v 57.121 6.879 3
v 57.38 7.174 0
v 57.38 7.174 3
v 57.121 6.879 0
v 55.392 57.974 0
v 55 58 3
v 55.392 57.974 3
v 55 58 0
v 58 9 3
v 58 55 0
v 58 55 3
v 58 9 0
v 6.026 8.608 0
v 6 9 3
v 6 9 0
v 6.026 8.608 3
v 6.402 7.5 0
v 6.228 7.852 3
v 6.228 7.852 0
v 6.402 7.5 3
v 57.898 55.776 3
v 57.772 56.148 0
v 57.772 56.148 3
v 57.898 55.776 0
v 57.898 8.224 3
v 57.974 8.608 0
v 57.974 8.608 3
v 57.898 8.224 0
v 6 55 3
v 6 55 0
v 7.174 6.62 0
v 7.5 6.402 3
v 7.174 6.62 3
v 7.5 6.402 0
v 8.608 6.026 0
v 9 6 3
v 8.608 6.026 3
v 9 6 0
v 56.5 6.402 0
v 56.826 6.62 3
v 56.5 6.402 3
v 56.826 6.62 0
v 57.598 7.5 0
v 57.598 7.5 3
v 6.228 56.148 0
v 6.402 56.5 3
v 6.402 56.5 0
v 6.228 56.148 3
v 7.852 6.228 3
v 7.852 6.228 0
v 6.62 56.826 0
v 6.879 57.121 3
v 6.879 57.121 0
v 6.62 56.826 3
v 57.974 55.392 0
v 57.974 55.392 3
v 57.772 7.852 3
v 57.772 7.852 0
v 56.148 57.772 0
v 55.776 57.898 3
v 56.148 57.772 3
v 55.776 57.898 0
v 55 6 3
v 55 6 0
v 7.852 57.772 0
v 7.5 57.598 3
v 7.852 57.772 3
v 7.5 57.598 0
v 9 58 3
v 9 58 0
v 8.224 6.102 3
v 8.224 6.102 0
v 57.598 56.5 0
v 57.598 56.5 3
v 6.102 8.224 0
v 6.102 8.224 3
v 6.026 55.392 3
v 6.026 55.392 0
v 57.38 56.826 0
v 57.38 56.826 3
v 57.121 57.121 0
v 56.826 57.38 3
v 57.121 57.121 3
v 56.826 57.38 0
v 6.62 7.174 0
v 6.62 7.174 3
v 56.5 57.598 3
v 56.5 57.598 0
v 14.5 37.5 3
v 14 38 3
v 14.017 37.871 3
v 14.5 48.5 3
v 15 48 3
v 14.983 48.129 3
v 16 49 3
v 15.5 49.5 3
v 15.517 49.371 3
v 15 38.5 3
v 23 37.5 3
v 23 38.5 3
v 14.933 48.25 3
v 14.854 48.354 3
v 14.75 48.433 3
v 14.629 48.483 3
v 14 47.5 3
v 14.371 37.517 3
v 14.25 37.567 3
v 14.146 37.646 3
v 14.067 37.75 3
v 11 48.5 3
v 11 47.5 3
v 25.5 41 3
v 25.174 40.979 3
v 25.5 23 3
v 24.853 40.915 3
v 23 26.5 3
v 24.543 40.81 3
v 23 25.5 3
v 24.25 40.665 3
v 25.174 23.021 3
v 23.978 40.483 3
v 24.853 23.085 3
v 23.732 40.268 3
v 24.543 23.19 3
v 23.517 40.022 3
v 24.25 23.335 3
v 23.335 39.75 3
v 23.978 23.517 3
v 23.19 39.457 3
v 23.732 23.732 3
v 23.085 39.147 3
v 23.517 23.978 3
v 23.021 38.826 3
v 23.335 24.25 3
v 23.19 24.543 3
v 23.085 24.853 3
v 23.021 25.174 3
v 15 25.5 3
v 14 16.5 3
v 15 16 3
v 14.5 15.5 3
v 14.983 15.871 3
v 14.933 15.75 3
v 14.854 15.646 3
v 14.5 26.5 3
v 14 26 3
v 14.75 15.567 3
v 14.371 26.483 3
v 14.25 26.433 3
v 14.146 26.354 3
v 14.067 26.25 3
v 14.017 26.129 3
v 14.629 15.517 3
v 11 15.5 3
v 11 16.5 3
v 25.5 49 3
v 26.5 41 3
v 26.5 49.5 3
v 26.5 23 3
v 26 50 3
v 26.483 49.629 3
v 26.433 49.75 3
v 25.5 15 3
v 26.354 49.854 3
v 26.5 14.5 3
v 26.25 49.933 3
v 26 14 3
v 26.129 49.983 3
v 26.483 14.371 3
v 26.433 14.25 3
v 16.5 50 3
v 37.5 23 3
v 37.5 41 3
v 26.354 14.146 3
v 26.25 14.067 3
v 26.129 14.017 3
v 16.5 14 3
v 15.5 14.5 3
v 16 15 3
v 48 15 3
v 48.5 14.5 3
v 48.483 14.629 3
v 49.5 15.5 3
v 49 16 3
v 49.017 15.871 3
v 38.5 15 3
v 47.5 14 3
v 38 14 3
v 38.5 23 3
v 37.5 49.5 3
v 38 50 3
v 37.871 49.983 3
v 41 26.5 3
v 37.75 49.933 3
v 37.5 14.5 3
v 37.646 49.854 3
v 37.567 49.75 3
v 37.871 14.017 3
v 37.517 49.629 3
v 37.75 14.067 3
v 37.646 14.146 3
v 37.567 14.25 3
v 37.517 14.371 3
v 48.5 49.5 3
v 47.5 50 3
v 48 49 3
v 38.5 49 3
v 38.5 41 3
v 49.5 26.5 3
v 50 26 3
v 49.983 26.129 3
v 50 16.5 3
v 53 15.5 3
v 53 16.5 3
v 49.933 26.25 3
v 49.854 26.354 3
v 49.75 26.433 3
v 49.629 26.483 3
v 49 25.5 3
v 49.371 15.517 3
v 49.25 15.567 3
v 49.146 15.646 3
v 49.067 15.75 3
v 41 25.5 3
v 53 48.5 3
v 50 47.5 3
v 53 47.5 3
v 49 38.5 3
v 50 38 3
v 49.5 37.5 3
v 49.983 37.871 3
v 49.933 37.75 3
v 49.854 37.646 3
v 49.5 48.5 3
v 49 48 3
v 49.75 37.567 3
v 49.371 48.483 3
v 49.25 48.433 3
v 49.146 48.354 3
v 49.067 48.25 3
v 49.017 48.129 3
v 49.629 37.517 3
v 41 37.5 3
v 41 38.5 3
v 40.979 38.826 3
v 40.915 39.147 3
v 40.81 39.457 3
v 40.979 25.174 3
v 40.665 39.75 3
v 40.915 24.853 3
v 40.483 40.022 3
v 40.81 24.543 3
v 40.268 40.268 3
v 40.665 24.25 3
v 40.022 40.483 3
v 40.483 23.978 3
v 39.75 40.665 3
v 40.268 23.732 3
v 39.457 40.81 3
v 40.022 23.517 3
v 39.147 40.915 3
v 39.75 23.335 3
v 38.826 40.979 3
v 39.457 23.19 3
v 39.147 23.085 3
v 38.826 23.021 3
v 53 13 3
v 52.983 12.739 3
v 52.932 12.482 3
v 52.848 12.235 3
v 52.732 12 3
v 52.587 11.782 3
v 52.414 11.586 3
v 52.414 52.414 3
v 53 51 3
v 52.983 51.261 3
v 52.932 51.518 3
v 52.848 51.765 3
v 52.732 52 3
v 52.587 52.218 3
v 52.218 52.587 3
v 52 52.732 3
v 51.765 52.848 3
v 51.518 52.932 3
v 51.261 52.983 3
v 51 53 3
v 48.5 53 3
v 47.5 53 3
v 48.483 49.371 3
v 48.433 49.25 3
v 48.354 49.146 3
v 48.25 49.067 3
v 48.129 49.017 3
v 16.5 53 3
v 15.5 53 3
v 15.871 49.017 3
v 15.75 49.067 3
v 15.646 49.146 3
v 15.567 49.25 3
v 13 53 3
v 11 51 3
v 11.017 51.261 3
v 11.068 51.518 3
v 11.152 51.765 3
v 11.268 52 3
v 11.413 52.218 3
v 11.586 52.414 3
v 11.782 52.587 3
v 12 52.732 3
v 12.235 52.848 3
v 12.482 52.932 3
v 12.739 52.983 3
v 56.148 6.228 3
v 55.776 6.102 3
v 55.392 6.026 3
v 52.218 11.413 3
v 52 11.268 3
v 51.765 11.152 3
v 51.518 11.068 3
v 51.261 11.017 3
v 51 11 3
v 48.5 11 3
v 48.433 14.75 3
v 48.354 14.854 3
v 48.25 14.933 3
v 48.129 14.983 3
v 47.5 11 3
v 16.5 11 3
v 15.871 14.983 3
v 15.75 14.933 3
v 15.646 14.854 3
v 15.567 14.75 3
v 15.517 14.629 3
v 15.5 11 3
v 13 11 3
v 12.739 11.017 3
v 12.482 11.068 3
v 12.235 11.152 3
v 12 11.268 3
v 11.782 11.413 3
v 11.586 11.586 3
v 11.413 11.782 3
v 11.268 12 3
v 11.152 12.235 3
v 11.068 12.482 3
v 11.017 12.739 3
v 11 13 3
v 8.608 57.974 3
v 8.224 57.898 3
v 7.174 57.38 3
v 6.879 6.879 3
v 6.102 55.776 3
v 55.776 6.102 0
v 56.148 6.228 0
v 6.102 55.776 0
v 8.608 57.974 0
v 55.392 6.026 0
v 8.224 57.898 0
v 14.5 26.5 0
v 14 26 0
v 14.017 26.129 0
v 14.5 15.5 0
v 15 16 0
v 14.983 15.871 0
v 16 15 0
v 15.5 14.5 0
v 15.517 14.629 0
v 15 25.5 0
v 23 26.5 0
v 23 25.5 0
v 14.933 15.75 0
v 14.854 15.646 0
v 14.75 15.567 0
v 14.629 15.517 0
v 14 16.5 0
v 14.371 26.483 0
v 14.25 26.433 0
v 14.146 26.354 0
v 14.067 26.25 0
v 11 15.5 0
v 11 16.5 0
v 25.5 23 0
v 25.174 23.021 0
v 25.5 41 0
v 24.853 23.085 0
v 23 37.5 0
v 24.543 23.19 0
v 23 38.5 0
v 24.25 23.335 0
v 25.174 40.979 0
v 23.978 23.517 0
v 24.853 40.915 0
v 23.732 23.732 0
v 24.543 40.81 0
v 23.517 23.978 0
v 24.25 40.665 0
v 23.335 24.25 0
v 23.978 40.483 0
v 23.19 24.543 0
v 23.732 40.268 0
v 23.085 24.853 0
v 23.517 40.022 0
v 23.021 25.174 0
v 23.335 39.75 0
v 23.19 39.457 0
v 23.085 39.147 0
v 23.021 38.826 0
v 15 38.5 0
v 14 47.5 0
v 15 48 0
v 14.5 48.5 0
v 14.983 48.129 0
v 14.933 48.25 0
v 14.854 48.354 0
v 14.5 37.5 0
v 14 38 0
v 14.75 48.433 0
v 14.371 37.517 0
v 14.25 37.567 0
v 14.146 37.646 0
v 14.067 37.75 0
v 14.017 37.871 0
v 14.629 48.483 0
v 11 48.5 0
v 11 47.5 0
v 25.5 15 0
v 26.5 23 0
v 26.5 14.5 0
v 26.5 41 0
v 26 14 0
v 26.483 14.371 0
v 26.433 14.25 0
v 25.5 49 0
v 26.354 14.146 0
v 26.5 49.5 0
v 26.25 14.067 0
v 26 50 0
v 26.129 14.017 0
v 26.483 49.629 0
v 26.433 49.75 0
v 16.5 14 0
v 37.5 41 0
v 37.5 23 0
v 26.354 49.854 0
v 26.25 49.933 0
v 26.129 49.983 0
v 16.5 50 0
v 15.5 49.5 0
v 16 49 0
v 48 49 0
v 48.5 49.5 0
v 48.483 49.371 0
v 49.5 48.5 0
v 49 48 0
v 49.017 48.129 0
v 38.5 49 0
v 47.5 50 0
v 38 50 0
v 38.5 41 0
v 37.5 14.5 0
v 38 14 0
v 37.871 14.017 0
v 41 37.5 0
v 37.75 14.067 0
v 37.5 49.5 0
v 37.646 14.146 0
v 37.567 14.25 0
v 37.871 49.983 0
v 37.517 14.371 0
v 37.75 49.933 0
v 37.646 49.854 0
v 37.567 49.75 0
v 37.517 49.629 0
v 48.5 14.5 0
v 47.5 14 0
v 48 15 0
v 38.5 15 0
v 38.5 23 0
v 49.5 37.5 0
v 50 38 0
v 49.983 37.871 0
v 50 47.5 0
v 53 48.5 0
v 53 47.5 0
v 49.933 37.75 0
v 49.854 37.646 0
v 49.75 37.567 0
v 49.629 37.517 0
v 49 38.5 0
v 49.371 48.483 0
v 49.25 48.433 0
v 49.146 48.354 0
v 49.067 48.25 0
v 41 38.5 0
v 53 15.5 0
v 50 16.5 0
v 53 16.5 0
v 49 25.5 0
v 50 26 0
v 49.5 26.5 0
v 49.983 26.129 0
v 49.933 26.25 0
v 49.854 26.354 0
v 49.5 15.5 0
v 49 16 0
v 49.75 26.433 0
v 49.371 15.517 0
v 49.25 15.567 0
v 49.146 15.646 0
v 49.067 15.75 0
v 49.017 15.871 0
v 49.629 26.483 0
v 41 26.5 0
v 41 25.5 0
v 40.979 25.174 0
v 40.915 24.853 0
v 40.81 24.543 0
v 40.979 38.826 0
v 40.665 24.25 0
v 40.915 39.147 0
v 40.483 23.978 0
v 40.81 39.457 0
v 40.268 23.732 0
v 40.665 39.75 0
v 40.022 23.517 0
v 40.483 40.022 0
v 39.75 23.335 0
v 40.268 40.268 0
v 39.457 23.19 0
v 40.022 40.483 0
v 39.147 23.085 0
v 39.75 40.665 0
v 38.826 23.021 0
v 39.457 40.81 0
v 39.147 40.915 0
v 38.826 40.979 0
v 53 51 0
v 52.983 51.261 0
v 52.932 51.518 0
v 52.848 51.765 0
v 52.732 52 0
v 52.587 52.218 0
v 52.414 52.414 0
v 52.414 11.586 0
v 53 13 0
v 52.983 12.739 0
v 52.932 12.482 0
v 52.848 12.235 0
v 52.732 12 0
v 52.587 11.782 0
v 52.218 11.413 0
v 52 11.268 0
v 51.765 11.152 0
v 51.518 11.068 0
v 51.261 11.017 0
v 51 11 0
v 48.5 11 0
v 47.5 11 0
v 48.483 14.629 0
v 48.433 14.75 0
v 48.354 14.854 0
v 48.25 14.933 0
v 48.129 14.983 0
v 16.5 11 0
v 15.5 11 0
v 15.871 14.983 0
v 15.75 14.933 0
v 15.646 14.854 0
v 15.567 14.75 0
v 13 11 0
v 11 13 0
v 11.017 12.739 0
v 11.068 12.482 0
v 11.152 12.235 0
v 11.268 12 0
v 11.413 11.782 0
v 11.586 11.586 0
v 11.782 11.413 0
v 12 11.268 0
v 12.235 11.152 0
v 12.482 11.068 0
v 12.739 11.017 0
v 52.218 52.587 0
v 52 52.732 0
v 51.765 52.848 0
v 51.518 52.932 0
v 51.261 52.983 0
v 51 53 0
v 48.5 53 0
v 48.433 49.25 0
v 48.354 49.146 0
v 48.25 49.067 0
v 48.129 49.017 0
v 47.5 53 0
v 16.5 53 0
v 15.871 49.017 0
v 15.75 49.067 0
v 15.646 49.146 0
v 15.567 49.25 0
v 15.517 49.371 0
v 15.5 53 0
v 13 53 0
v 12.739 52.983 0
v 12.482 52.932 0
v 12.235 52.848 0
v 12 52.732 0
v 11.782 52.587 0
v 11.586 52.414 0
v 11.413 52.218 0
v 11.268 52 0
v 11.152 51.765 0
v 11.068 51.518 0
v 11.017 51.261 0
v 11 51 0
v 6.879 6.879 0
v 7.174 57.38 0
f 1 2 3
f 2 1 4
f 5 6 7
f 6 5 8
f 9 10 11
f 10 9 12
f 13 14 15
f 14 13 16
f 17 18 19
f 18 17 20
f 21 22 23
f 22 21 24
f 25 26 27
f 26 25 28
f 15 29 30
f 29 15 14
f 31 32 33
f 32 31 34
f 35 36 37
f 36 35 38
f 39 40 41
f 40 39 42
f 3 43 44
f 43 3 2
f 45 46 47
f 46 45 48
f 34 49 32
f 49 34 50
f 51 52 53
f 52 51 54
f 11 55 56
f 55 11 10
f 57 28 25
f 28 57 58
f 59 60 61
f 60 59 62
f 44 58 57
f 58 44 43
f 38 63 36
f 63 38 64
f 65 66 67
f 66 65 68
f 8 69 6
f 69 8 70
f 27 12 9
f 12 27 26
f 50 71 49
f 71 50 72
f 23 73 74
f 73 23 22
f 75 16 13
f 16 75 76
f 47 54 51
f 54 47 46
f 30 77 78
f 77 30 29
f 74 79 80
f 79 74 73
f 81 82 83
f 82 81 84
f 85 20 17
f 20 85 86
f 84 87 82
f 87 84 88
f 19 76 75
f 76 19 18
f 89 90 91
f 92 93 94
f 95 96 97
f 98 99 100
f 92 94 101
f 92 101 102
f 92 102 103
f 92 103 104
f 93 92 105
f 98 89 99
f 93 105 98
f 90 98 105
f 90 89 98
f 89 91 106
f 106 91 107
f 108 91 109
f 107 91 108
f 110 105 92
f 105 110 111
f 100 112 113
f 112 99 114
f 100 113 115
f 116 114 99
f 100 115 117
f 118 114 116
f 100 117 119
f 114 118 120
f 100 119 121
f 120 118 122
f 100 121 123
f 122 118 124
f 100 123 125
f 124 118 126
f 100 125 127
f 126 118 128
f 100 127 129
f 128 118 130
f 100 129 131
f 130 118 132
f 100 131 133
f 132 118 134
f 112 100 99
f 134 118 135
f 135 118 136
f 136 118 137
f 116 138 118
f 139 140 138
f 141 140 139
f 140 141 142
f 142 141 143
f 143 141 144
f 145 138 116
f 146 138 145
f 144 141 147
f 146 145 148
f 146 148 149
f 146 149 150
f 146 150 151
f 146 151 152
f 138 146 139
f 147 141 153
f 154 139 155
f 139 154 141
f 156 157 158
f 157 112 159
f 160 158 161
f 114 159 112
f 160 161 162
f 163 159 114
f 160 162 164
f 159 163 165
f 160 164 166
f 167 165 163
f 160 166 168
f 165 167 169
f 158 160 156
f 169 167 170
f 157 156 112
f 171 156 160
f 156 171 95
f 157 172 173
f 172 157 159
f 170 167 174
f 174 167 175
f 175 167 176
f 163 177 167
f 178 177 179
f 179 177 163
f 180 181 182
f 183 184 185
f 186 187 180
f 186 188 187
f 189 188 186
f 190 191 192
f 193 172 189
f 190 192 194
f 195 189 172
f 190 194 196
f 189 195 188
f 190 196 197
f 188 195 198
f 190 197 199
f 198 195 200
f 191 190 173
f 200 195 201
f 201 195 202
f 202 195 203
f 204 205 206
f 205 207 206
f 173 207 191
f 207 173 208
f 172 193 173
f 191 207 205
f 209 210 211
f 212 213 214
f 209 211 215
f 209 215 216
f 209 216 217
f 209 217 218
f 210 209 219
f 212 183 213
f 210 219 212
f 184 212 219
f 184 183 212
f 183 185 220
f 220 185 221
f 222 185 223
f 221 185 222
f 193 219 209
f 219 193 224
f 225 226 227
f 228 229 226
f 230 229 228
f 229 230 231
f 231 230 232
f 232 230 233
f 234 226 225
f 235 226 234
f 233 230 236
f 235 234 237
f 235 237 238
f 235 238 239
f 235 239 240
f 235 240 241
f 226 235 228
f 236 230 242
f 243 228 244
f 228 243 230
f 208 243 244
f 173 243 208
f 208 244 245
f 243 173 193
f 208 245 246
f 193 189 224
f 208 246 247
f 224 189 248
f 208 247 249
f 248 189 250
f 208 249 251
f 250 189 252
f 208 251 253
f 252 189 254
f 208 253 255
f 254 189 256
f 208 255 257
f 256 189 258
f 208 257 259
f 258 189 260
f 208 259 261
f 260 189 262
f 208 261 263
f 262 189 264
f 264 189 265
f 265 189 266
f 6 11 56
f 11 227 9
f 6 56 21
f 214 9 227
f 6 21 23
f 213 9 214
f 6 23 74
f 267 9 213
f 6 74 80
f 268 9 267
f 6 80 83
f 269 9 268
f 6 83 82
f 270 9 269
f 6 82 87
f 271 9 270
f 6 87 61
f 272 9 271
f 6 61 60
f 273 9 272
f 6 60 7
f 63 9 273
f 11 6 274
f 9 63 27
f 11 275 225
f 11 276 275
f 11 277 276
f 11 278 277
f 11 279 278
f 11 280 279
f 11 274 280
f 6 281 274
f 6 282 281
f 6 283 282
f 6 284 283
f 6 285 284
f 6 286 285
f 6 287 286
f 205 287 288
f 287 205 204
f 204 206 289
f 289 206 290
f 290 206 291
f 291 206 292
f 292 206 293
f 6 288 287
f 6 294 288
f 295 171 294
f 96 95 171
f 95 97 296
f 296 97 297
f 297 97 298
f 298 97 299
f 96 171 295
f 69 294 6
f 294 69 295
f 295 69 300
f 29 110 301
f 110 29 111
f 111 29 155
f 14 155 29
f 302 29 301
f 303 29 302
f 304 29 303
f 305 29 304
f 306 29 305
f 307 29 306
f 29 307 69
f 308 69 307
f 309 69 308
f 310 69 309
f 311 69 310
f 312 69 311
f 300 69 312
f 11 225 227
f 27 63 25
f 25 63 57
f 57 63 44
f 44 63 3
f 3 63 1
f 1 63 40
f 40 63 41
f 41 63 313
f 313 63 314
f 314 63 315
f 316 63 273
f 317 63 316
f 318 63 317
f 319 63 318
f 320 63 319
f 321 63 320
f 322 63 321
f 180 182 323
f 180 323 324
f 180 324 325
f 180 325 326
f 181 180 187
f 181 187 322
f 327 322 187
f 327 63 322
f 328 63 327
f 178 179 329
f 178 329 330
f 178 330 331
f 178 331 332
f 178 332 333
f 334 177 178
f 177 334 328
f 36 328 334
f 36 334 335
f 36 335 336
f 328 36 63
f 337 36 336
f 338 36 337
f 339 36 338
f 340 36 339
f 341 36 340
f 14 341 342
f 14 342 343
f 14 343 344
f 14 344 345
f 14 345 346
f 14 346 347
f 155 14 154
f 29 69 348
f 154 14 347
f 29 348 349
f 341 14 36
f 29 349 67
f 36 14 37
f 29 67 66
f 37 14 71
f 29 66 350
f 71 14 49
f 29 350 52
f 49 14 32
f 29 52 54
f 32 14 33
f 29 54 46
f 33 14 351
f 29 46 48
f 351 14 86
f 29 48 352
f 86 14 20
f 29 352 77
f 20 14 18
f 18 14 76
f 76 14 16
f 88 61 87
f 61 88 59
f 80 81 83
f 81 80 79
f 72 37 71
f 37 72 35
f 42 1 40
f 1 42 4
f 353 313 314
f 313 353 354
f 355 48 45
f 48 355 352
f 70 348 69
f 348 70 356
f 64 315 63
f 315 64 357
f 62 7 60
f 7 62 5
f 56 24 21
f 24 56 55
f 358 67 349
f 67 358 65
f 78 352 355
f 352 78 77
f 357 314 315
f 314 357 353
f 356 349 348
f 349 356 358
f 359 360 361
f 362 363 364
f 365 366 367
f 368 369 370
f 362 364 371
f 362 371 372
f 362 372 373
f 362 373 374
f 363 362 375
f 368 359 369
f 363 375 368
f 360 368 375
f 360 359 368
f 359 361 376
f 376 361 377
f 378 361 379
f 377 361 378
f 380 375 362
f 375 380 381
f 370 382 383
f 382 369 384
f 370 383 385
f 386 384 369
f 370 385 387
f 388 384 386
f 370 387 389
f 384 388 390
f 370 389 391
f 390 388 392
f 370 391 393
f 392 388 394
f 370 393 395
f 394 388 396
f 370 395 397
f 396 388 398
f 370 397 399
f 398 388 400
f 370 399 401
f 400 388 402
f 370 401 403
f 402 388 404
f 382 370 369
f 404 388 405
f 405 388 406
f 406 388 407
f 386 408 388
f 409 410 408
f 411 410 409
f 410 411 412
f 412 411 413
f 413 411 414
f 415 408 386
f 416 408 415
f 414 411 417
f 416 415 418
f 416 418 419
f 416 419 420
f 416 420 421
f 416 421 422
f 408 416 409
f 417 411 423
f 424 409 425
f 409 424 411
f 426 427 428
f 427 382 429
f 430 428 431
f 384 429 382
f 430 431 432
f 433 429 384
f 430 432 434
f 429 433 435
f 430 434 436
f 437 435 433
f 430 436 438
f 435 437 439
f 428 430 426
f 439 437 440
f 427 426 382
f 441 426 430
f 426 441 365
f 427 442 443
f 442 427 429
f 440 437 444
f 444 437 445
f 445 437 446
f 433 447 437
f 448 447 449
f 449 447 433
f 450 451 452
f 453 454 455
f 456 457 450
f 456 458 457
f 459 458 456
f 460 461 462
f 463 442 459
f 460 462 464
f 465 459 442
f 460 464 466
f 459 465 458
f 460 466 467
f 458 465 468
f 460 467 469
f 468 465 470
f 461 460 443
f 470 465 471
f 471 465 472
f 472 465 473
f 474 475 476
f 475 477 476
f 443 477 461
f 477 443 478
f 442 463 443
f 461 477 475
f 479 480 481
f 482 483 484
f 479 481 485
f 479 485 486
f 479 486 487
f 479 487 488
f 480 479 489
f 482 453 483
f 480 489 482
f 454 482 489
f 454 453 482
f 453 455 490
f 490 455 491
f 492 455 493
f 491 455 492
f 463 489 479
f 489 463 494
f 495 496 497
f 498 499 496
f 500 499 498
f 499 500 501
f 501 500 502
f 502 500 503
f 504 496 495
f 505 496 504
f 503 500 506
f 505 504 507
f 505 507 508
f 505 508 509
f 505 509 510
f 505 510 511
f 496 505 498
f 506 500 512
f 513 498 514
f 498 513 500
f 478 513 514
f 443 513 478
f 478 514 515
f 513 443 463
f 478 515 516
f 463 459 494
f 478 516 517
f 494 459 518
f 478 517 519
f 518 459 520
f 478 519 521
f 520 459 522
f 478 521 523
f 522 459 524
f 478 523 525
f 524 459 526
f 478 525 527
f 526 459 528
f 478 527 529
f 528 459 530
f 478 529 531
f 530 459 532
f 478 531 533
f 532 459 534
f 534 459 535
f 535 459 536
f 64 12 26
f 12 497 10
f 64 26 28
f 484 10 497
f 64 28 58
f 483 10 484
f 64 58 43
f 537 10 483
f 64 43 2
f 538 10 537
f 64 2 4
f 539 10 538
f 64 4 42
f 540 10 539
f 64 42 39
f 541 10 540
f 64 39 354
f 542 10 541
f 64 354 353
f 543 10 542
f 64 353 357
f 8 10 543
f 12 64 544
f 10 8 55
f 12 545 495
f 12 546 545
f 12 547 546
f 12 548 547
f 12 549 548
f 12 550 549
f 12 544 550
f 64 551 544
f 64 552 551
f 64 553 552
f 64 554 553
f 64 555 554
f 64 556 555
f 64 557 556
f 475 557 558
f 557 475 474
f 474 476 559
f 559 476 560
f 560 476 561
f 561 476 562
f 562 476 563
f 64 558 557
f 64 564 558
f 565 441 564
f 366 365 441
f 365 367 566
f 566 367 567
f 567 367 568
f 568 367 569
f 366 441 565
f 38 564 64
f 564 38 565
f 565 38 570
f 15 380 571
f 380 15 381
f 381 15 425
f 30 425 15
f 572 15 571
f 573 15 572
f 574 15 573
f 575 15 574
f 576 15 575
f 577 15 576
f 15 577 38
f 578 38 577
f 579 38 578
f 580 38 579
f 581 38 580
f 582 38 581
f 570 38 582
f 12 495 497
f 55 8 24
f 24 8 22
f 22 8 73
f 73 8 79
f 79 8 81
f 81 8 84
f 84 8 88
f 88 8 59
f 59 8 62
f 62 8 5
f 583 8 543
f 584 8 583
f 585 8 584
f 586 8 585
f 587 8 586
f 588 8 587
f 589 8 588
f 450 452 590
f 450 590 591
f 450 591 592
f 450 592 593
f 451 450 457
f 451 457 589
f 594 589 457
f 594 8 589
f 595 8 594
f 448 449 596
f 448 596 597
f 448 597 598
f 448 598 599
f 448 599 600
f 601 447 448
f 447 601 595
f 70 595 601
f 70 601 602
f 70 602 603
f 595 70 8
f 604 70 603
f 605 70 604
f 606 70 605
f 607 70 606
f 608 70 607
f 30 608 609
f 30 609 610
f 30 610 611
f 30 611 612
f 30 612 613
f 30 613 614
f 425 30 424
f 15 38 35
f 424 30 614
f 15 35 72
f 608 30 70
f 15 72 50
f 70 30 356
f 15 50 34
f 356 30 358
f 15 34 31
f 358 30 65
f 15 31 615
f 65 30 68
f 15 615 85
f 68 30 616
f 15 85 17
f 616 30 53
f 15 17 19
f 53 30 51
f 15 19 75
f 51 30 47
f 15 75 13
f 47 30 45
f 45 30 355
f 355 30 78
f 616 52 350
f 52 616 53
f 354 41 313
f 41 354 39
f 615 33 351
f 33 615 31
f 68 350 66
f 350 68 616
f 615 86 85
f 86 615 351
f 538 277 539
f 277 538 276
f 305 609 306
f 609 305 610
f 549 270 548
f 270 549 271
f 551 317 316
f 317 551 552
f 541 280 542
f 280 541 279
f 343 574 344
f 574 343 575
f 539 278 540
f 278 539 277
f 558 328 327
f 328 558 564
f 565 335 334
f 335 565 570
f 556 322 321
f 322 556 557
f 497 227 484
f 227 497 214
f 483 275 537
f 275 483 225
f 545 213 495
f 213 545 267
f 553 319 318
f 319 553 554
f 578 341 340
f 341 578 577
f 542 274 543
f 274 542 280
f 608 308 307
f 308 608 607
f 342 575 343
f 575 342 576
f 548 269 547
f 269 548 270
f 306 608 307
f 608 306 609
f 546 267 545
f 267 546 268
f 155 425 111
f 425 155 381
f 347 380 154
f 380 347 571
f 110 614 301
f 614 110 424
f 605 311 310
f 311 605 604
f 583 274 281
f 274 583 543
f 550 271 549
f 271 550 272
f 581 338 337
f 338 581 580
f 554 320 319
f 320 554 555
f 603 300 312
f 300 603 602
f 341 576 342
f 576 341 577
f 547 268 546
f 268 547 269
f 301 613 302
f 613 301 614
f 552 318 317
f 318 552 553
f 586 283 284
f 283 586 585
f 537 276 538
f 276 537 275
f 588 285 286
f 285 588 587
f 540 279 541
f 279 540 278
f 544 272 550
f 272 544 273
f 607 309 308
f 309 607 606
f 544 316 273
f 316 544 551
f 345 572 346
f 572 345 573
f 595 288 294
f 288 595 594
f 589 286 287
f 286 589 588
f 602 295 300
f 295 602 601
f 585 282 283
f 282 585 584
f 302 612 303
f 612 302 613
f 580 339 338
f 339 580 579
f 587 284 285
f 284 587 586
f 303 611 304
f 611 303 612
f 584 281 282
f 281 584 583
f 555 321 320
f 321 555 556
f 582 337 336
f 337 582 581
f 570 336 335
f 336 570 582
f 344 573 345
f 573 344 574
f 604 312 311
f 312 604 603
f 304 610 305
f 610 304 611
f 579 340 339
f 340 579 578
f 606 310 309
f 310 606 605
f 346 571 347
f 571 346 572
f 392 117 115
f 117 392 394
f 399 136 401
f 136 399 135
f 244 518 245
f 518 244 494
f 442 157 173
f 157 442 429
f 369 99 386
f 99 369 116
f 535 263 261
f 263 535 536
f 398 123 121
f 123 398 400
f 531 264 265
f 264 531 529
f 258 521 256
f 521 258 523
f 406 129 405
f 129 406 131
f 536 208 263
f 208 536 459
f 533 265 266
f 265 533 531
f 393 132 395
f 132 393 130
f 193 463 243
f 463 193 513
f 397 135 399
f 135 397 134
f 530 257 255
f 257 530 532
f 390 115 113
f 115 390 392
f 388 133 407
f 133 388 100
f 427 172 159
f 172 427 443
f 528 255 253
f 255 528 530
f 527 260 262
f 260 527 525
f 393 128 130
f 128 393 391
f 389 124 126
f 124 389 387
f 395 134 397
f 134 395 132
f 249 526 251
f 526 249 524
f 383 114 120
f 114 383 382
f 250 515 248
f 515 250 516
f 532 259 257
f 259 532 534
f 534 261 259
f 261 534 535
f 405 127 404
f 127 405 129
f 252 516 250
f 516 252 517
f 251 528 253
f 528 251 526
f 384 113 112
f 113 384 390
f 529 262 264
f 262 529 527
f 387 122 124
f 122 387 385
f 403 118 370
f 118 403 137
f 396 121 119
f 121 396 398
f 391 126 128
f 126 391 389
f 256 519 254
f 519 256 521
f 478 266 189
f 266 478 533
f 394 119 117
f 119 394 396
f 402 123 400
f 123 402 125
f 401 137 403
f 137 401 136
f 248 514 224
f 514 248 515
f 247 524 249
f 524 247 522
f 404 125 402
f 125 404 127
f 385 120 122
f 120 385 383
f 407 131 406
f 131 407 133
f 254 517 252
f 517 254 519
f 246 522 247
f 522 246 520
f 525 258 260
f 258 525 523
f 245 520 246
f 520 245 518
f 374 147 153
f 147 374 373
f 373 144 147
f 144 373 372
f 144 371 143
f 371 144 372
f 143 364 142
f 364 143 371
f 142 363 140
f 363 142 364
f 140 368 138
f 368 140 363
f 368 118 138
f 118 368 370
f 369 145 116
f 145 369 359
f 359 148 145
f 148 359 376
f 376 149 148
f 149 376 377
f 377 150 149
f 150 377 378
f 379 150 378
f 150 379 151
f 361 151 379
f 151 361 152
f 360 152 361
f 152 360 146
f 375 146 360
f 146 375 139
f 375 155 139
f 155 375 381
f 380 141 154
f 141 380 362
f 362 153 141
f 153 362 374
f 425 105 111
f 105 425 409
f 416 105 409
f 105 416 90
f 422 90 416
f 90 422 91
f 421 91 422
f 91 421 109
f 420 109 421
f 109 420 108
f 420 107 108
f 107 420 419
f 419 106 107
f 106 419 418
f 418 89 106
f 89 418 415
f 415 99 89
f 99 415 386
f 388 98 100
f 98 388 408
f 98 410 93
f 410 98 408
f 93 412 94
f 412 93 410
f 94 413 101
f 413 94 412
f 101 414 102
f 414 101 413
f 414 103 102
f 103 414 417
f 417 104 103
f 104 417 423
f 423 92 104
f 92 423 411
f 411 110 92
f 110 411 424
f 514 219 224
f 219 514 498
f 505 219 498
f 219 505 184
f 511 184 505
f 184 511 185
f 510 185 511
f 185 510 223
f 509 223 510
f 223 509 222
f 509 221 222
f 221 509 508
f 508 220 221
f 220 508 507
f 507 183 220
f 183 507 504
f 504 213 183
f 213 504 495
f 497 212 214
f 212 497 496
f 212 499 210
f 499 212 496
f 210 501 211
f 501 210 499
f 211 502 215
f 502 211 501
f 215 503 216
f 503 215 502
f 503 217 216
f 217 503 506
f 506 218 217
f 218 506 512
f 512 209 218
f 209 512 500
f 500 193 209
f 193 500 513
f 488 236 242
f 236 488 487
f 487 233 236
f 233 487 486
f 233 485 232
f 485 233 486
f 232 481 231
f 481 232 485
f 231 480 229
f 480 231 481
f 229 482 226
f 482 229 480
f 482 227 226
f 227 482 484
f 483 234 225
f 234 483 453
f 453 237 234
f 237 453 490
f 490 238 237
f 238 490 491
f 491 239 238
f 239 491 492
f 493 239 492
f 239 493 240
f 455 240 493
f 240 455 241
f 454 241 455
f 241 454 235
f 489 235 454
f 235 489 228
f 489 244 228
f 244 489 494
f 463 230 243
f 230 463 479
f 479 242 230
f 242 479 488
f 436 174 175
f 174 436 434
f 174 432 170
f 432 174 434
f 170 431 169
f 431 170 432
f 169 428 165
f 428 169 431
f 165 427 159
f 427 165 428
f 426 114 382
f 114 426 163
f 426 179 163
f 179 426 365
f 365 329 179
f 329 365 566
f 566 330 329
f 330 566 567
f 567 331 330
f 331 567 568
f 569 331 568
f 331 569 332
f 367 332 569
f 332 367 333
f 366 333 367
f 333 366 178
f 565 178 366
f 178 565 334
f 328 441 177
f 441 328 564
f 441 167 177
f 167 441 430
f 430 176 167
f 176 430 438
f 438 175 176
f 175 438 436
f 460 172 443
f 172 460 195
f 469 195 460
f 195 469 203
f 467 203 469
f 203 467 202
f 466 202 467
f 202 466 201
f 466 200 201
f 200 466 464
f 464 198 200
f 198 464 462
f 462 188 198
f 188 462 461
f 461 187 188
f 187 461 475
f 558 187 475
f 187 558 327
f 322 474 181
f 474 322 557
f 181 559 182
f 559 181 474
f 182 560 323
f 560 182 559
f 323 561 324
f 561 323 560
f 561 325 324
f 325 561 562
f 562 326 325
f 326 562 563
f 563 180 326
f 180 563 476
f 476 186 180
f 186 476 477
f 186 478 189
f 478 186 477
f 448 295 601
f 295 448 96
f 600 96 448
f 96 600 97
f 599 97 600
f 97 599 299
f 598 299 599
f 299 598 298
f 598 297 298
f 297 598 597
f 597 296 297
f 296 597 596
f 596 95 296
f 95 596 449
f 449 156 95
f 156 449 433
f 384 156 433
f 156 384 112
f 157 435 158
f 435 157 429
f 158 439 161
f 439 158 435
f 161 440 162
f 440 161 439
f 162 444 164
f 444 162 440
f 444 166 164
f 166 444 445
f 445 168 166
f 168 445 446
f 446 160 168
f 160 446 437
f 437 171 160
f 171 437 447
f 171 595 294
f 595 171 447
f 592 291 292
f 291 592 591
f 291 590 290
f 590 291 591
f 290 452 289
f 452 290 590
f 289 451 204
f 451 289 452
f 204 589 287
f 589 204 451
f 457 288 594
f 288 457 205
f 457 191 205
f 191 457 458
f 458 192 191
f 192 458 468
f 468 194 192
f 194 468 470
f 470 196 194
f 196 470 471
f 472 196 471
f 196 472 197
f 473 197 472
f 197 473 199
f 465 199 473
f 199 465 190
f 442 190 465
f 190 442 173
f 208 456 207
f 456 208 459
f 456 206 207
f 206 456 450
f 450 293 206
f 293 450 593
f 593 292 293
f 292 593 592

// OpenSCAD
/*
Sample 026: XY-Festkörpertisch — ausgewogen 1,0 mm
Generated from the FDM Mechanical Sample Library.
Units: millimetres.

Override examples:
  openscad -o custom.stl -D 'view="plate"' -D 'render_fn=64' model.scad
  openscad -o preview.png -D 'view="assembly"' model.scad
*/
use <../../../library/fdm_mechanisms.scad>

render_fn = is_undef(render_fn) ? 48 : render_fn;
view = is_undef(view) ? "plate" : view;
$fn = render_fn;

sample_xy_flexure_stage(
    view=view,
    beam_w=1,
    beam_l=17
);
